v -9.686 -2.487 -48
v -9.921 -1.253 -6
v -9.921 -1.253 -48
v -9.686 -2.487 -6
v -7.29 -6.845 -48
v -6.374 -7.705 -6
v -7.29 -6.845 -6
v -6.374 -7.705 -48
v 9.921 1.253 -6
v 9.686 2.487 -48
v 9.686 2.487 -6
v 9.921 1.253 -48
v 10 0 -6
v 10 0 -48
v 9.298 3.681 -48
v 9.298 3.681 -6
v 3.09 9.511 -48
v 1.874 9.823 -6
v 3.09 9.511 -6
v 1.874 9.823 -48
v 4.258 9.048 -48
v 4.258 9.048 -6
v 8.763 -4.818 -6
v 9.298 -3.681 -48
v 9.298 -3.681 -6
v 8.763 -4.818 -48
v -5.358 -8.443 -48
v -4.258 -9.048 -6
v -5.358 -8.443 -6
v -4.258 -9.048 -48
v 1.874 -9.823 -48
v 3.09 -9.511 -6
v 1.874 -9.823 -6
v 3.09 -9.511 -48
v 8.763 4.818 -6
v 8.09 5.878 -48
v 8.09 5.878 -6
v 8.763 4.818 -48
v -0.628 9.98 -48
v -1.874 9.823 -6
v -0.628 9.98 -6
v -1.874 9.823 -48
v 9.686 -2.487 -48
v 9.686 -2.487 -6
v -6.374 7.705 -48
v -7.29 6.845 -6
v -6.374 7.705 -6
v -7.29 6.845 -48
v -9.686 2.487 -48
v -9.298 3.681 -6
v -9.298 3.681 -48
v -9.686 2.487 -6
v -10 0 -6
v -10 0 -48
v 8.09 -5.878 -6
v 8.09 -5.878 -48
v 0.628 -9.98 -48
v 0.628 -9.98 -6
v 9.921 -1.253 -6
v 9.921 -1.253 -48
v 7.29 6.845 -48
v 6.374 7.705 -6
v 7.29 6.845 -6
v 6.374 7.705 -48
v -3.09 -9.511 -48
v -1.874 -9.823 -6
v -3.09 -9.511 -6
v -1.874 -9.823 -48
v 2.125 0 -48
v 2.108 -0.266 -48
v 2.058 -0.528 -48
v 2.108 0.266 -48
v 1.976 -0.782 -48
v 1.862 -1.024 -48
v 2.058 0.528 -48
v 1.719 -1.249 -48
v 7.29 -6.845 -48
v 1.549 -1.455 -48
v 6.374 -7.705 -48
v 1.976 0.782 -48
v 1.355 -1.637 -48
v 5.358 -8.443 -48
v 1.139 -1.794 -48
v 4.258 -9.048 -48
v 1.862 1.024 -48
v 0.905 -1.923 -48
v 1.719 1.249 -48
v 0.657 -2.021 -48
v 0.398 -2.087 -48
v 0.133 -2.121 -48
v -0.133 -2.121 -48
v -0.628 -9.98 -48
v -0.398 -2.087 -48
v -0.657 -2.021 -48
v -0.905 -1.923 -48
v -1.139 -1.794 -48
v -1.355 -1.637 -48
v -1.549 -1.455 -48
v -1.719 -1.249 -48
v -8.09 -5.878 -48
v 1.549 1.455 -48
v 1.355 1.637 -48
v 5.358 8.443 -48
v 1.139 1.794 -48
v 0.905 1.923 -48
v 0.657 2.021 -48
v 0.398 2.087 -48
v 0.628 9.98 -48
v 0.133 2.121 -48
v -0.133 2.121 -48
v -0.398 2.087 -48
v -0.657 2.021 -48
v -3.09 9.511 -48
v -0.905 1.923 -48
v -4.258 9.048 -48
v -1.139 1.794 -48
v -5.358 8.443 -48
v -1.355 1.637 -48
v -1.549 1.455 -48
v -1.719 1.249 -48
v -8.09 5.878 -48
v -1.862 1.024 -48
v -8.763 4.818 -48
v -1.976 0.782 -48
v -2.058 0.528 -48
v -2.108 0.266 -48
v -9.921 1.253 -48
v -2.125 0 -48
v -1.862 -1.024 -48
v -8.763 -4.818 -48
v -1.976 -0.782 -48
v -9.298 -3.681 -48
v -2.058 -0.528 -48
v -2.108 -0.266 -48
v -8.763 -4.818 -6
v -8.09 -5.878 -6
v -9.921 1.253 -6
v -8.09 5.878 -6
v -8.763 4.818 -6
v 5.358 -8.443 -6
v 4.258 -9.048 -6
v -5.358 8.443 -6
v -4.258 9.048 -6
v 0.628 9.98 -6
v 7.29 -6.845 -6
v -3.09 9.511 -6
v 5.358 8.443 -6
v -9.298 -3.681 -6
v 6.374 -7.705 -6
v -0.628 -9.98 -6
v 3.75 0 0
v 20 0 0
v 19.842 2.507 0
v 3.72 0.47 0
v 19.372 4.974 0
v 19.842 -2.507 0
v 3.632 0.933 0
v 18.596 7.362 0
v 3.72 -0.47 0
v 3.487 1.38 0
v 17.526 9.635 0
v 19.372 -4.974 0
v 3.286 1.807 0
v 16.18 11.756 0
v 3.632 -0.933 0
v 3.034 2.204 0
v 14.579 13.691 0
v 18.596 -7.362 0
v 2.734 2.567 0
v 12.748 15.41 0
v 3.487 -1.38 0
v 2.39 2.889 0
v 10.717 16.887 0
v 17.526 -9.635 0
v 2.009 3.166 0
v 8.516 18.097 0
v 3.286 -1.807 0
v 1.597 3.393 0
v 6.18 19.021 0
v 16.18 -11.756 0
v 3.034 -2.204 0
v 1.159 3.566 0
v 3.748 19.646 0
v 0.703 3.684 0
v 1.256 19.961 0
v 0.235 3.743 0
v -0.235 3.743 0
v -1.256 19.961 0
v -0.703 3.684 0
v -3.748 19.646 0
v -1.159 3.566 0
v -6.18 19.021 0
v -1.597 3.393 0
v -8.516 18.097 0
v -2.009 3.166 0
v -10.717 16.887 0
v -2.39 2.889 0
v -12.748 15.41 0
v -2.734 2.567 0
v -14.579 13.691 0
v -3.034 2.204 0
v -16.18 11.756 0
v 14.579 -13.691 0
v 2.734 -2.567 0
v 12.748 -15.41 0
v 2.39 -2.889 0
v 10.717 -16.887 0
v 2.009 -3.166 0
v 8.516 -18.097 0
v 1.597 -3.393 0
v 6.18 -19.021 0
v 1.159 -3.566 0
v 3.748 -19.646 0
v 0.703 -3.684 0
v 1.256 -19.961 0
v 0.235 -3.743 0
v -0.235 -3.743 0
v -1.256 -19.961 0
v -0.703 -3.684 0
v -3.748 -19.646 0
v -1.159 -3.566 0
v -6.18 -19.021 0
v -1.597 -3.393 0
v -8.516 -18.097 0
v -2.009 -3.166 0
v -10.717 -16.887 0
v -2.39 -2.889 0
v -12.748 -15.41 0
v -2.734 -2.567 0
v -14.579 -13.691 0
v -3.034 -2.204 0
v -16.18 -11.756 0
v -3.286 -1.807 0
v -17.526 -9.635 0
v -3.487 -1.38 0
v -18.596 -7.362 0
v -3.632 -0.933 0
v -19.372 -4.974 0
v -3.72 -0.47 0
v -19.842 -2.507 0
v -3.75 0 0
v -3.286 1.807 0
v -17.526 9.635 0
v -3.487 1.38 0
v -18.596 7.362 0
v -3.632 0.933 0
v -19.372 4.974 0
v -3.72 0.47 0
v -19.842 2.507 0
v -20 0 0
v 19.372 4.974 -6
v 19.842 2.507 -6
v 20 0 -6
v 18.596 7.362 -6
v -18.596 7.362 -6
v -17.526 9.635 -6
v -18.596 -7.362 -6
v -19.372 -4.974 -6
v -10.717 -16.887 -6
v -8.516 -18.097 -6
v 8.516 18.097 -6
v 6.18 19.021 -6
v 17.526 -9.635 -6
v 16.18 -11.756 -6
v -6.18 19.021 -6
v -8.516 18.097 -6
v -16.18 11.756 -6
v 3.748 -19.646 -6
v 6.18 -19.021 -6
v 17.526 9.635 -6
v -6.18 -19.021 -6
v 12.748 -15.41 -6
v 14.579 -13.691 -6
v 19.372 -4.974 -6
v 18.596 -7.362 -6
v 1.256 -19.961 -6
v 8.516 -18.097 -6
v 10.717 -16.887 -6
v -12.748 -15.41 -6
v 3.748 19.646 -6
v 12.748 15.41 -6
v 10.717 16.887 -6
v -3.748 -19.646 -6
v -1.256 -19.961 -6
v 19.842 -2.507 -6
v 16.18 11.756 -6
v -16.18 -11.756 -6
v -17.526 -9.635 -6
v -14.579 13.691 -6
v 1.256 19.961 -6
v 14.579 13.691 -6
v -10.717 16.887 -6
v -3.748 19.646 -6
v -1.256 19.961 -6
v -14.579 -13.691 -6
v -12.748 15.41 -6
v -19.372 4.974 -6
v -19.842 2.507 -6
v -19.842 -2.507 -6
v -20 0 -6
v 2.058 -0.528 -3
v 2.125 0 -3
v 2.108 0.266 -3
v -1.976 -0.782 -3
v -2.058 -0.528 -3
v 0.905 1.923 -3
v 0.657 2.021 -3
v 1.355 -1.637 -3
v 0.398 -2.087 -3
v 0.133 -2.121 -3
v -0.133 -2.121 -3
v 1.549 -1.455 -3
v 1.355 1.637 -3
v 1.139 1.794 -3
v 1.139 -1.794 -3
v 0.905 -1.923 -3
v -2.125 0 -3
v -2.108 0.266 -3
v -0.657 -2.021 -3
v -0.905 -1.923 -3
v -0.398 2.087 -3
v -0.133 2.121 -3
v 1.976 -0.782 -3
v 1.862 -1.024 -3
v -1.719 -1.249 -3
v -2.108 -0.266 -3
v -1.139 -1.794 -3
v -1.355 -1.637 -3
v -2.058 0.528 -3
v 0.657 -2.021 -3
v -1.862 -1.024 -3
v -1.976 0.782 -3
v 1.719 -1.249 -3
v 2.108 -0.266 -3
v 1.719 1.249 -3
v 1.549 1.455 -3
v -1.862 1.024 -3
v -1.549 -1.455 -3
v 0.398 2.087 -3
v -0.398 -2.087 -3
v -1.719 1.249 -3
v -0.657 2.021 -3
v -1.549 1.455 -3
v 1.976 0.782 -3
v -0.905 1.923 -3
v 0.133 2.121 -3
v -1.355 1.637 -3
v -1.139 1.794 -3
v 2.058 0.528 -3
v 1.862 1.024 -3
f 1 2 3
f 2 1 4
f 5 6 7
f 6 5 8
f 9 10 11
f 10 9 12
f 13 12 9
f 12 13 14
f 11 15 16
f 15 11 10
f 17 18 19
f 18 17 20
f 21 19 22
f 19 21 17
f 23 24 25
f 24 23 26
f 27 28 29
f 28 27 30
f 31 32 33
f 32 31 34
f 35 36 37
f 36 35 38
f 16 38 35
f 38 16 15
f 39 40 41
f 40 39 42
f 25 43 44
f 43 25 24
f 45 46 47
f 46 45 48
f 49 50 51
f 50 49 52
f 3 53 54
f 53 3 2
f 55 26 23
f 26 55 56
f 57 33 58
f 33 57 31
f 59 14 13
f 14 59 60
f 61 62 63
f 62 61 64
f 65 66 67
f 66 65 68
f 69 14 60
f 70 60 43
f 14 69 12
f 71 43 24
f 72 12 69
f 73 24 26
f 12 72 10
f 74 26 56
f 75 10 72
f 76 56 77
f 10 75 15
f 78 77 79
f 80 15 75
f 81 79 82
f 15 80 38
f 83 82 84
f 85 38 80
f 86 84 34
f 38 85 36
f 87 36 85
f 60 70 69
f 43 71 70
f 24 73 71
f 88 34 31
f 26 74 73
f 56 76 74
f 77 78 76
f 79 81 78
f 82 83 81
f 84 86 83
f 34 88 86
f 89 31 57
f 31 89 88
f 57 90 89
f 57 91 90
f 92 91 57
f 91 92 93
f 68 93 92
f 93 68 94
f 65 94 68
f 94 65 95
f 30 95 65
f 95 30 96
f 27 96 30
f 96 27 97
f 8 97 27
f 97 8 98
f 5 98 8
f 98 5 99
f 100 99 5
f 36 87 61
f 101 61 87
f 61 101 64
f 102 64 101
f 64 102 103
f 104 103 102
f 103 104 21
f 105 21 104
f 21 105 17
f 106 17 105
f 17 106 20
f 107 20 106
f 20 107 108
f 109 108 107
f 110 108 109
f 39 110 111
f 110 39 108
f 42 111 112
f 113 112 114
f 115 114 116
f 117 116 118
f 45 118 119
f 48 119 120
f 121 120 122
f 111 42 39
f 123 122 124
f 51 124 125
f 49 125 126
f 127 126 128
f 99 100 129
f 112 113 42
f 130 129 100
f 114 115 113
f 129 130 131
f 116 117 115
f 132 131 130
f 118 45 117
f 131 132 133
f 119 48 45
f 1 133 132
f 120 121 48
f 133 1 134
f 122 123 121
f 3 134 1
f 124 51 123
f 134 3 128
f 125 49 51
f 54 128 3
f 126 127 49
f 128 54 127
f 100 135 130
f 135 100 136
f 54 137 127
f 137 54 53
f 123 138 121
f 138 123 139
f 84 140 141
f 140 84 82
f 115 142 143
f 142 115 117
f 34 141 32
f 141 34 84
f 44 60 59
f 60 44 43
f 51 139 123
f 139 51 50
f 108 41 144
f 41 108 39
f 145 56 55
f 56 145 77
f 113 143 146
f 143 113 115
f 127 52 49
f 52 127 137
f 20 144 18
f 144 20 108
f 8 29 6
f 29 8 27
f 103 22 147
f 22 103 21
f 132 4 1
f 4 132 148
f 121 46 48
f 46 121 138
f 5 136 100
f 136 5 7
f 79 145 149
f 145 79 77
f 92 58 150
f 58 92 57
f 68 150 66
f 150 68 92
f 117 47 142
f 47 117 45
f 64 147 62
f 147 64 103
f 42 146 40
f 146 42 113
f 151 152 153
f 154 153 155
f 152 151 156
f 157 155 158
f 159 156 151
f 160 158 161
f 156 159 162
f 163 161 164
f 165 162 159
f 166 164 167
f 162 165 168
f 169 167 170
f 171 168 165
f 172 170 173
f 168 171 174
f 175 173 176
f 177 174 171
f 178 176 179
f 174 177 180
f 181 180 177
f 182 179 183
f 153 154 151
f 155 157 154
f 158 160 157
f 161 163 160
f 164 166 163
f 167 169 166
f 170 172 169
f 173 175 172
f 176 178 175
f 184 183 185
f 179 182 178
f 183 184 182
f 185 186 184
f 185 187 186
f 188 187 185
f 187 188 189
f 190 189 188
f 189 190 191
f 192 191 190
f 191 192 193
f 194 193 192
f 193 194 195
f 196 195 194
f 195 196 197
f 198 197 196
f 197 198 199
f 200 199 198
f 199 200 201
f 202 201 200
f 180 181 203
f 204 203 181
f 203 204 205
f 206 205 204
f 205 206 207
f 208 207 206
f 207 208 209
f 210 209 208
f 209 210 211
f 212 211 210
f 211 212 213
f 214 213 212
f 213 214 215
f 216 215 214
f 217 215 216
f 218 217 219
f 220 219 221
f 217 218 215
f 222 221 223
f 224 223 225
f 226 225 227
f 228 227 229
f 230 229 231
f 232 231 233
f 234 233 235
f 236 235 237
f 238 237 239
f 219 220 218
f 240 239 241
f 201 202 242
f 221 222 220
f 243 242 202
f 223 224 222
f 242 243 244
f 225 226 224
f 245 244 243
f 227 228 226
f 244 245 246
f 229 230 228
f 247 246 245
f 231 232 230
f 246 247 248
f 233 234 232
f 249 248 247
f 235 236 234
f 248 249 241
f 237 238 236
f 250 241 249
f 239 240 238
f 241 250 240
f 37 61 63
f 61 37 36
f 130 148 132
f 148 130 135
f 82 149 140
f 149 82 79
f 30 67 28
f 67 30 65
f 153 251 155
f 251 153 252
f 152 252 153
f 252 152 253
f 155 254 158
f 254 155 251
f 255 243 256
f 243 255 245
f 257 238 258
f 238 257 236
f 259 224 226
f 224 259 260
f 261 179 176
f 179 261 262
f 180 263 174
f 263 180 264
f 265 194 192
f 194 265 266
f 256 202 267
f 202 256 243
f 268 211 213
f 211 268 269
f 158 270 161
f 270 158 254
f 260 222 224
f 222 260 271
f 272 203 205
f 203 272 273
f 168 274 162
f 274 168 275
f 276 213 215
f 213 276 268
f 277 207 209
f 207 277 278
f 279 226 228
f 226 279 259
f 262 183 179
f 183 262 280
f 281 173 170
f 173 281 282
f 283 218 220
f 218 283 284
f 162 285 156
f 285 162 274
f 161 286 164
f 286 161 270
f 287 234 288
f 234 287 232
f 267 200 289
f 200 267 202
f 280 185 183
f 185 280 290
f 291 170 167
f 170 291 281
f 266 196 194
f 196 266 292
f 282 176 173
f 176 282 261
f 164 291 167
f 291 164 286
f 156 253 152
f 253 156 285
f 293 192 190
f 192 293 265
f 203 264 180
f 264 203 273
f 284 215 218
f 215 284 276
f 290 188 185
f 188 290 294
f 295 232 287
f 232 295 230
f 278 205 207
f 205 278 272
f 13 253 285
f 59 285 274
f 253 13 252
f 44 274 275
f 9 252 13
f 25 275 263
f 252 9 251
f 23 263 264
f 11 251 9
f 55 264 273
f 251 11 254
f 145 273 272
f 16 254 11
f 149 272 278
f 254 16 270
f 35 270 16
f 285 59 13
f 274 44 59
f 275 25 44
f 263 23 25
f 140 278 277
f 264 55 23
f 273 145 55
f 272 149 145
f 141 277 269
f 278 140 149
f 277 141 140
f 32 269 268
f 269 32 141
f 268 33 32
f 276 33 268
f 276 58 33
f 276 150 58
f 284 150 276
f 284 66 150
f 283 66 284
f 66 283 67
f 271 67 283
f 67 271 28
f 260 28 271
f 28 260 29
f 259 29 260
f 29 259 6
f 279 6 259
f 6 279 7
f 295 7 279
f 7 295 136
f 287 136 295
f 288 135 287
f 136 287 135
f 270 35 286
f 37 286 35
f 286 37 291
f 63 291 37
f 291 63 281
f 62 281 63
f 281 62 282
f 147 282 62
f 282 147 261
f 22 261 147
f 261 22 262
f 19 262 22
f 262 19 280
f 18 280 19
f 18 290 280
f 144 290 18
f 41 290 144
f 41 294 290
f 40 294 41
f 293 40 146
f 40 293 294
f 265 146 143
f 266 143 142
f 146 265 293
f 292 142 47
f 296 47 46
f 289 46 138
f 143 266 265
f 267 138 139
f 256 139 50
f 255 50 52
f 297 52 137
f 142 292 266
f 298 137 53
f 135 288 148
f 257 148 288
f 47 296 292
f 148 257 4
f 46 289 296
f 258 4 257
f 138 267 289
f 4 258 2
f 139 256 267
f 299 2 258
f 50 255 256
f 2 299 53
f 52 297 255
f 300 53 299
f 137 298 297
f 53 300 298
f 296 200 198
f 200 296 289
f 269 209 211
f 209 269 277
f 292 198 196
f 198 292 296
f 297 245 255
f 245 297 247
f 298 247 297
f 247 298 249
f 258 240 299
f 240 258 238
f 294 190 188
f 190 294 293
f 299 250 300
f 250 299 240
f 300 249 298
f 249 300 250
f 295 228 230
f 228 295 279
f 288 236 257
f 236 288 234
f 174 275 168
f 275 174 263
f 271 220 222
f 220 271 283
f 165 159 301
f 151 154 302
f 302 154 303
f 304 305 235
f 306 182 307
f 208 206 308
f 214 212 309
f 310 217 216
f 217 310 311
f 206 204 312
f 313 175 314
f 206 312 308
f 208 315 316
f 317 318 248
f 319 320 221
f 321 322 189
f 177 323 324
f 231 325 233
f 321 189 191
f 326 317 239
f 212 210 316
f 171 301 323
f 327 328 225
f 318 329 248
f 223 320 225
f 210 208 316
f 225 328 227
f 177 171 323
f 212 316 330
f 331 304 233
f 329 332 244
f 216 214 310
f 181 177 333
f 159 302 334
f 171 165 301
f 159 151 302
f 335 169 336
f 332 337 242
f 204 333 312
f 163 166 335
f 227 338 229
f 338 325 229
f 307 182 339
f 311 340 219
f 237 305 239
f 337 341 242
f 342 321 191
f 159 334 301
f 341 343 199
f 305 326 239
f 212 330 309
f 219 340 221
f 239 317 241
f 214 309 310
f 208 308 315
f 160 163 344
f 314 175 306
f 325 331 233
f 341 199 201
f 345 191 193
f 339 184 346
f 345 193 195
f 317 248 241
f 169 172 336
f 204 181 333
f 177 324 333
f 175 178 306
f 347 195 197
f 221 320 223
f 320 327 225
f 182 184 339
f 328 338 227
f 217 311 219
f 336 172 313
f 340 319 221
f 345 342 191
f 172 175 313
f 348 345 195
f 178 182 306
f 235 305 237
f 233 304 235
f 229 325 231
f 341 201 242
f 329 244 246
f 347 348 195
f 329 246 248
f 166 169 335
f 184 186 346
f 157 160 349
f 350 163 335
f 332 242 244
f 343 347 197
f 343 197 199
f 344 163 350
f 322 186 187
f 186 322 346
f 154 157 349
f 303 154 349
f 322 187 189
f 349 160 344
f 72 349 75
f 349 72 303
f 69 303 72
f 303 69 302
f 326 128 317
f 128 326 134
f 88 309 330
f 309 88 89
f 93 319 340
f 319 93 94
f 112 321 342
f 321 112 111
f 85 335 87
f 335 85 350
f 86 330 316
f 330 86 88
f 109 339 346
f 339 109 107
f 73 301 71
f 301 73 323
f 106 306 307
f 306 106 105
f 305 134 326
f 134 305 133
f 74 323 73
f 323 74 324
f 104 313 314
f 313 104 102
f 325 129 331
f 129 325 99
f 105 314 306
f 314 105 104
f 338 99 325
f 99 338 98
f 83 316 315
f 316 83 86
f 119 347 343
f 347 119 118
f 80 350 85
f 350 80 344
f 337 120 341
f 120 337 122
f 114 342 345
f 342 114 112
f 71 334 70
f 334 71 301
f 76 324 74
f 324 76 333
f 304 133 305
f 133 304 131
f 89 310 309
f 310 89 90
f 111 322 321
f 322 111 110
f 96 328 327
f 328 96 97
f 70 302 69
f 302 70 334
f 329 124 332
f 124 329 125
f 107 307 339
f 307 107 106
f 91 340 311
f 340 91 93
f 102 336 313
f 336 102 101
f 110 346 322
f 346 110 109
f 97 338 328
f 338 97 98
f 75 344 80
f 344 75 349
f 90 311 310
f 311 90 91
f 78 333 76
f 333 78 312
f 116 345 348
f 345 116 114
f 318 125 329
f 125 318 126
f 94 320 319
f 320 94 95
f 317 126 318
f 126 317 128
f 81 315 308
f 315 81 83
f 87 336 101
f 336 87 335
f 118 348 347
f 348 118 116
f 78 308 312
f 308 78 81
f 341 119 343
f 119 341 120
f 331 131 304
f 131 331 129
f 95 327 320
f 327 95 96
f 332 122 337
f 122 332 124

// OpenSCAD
$fn = 50;


difference() {
	union() {
		translate(v = [0, 0, -48.0000000000]) {
			cylinder(h = 48, r = 10.0000000000);
		}
		translate(v = [0, 0, -6.0000000000]) {
			cylinder(h = 6, r = 20.0000000000);
		}
	}
	union() {
		translate(v = [0, 0, 0]) {
			rotate(a = [0, 0, 0]) {
				difference() {
					union() {
						#translate(v = [0, 0, -48.0000000000]) {
							cylinder(h = 48, r = 2.0000000000);
						}
						#translate(v = [0, 0, -3]) {
							cylinder(h = 3, r1 = 2.1250000000, r2 = 3.7500000000);
						}
						#translate(v = [0, 0, -48.0000000000]) {
							cylinder(h = 48, r = 2.1250000000);
						}
						#translate(v = [0, 0, -48.0000000000]) {
							cylinder(h = 48, r = 2.0000000000);
						}
					}
					union();
				}
			}
		}
	}
}
